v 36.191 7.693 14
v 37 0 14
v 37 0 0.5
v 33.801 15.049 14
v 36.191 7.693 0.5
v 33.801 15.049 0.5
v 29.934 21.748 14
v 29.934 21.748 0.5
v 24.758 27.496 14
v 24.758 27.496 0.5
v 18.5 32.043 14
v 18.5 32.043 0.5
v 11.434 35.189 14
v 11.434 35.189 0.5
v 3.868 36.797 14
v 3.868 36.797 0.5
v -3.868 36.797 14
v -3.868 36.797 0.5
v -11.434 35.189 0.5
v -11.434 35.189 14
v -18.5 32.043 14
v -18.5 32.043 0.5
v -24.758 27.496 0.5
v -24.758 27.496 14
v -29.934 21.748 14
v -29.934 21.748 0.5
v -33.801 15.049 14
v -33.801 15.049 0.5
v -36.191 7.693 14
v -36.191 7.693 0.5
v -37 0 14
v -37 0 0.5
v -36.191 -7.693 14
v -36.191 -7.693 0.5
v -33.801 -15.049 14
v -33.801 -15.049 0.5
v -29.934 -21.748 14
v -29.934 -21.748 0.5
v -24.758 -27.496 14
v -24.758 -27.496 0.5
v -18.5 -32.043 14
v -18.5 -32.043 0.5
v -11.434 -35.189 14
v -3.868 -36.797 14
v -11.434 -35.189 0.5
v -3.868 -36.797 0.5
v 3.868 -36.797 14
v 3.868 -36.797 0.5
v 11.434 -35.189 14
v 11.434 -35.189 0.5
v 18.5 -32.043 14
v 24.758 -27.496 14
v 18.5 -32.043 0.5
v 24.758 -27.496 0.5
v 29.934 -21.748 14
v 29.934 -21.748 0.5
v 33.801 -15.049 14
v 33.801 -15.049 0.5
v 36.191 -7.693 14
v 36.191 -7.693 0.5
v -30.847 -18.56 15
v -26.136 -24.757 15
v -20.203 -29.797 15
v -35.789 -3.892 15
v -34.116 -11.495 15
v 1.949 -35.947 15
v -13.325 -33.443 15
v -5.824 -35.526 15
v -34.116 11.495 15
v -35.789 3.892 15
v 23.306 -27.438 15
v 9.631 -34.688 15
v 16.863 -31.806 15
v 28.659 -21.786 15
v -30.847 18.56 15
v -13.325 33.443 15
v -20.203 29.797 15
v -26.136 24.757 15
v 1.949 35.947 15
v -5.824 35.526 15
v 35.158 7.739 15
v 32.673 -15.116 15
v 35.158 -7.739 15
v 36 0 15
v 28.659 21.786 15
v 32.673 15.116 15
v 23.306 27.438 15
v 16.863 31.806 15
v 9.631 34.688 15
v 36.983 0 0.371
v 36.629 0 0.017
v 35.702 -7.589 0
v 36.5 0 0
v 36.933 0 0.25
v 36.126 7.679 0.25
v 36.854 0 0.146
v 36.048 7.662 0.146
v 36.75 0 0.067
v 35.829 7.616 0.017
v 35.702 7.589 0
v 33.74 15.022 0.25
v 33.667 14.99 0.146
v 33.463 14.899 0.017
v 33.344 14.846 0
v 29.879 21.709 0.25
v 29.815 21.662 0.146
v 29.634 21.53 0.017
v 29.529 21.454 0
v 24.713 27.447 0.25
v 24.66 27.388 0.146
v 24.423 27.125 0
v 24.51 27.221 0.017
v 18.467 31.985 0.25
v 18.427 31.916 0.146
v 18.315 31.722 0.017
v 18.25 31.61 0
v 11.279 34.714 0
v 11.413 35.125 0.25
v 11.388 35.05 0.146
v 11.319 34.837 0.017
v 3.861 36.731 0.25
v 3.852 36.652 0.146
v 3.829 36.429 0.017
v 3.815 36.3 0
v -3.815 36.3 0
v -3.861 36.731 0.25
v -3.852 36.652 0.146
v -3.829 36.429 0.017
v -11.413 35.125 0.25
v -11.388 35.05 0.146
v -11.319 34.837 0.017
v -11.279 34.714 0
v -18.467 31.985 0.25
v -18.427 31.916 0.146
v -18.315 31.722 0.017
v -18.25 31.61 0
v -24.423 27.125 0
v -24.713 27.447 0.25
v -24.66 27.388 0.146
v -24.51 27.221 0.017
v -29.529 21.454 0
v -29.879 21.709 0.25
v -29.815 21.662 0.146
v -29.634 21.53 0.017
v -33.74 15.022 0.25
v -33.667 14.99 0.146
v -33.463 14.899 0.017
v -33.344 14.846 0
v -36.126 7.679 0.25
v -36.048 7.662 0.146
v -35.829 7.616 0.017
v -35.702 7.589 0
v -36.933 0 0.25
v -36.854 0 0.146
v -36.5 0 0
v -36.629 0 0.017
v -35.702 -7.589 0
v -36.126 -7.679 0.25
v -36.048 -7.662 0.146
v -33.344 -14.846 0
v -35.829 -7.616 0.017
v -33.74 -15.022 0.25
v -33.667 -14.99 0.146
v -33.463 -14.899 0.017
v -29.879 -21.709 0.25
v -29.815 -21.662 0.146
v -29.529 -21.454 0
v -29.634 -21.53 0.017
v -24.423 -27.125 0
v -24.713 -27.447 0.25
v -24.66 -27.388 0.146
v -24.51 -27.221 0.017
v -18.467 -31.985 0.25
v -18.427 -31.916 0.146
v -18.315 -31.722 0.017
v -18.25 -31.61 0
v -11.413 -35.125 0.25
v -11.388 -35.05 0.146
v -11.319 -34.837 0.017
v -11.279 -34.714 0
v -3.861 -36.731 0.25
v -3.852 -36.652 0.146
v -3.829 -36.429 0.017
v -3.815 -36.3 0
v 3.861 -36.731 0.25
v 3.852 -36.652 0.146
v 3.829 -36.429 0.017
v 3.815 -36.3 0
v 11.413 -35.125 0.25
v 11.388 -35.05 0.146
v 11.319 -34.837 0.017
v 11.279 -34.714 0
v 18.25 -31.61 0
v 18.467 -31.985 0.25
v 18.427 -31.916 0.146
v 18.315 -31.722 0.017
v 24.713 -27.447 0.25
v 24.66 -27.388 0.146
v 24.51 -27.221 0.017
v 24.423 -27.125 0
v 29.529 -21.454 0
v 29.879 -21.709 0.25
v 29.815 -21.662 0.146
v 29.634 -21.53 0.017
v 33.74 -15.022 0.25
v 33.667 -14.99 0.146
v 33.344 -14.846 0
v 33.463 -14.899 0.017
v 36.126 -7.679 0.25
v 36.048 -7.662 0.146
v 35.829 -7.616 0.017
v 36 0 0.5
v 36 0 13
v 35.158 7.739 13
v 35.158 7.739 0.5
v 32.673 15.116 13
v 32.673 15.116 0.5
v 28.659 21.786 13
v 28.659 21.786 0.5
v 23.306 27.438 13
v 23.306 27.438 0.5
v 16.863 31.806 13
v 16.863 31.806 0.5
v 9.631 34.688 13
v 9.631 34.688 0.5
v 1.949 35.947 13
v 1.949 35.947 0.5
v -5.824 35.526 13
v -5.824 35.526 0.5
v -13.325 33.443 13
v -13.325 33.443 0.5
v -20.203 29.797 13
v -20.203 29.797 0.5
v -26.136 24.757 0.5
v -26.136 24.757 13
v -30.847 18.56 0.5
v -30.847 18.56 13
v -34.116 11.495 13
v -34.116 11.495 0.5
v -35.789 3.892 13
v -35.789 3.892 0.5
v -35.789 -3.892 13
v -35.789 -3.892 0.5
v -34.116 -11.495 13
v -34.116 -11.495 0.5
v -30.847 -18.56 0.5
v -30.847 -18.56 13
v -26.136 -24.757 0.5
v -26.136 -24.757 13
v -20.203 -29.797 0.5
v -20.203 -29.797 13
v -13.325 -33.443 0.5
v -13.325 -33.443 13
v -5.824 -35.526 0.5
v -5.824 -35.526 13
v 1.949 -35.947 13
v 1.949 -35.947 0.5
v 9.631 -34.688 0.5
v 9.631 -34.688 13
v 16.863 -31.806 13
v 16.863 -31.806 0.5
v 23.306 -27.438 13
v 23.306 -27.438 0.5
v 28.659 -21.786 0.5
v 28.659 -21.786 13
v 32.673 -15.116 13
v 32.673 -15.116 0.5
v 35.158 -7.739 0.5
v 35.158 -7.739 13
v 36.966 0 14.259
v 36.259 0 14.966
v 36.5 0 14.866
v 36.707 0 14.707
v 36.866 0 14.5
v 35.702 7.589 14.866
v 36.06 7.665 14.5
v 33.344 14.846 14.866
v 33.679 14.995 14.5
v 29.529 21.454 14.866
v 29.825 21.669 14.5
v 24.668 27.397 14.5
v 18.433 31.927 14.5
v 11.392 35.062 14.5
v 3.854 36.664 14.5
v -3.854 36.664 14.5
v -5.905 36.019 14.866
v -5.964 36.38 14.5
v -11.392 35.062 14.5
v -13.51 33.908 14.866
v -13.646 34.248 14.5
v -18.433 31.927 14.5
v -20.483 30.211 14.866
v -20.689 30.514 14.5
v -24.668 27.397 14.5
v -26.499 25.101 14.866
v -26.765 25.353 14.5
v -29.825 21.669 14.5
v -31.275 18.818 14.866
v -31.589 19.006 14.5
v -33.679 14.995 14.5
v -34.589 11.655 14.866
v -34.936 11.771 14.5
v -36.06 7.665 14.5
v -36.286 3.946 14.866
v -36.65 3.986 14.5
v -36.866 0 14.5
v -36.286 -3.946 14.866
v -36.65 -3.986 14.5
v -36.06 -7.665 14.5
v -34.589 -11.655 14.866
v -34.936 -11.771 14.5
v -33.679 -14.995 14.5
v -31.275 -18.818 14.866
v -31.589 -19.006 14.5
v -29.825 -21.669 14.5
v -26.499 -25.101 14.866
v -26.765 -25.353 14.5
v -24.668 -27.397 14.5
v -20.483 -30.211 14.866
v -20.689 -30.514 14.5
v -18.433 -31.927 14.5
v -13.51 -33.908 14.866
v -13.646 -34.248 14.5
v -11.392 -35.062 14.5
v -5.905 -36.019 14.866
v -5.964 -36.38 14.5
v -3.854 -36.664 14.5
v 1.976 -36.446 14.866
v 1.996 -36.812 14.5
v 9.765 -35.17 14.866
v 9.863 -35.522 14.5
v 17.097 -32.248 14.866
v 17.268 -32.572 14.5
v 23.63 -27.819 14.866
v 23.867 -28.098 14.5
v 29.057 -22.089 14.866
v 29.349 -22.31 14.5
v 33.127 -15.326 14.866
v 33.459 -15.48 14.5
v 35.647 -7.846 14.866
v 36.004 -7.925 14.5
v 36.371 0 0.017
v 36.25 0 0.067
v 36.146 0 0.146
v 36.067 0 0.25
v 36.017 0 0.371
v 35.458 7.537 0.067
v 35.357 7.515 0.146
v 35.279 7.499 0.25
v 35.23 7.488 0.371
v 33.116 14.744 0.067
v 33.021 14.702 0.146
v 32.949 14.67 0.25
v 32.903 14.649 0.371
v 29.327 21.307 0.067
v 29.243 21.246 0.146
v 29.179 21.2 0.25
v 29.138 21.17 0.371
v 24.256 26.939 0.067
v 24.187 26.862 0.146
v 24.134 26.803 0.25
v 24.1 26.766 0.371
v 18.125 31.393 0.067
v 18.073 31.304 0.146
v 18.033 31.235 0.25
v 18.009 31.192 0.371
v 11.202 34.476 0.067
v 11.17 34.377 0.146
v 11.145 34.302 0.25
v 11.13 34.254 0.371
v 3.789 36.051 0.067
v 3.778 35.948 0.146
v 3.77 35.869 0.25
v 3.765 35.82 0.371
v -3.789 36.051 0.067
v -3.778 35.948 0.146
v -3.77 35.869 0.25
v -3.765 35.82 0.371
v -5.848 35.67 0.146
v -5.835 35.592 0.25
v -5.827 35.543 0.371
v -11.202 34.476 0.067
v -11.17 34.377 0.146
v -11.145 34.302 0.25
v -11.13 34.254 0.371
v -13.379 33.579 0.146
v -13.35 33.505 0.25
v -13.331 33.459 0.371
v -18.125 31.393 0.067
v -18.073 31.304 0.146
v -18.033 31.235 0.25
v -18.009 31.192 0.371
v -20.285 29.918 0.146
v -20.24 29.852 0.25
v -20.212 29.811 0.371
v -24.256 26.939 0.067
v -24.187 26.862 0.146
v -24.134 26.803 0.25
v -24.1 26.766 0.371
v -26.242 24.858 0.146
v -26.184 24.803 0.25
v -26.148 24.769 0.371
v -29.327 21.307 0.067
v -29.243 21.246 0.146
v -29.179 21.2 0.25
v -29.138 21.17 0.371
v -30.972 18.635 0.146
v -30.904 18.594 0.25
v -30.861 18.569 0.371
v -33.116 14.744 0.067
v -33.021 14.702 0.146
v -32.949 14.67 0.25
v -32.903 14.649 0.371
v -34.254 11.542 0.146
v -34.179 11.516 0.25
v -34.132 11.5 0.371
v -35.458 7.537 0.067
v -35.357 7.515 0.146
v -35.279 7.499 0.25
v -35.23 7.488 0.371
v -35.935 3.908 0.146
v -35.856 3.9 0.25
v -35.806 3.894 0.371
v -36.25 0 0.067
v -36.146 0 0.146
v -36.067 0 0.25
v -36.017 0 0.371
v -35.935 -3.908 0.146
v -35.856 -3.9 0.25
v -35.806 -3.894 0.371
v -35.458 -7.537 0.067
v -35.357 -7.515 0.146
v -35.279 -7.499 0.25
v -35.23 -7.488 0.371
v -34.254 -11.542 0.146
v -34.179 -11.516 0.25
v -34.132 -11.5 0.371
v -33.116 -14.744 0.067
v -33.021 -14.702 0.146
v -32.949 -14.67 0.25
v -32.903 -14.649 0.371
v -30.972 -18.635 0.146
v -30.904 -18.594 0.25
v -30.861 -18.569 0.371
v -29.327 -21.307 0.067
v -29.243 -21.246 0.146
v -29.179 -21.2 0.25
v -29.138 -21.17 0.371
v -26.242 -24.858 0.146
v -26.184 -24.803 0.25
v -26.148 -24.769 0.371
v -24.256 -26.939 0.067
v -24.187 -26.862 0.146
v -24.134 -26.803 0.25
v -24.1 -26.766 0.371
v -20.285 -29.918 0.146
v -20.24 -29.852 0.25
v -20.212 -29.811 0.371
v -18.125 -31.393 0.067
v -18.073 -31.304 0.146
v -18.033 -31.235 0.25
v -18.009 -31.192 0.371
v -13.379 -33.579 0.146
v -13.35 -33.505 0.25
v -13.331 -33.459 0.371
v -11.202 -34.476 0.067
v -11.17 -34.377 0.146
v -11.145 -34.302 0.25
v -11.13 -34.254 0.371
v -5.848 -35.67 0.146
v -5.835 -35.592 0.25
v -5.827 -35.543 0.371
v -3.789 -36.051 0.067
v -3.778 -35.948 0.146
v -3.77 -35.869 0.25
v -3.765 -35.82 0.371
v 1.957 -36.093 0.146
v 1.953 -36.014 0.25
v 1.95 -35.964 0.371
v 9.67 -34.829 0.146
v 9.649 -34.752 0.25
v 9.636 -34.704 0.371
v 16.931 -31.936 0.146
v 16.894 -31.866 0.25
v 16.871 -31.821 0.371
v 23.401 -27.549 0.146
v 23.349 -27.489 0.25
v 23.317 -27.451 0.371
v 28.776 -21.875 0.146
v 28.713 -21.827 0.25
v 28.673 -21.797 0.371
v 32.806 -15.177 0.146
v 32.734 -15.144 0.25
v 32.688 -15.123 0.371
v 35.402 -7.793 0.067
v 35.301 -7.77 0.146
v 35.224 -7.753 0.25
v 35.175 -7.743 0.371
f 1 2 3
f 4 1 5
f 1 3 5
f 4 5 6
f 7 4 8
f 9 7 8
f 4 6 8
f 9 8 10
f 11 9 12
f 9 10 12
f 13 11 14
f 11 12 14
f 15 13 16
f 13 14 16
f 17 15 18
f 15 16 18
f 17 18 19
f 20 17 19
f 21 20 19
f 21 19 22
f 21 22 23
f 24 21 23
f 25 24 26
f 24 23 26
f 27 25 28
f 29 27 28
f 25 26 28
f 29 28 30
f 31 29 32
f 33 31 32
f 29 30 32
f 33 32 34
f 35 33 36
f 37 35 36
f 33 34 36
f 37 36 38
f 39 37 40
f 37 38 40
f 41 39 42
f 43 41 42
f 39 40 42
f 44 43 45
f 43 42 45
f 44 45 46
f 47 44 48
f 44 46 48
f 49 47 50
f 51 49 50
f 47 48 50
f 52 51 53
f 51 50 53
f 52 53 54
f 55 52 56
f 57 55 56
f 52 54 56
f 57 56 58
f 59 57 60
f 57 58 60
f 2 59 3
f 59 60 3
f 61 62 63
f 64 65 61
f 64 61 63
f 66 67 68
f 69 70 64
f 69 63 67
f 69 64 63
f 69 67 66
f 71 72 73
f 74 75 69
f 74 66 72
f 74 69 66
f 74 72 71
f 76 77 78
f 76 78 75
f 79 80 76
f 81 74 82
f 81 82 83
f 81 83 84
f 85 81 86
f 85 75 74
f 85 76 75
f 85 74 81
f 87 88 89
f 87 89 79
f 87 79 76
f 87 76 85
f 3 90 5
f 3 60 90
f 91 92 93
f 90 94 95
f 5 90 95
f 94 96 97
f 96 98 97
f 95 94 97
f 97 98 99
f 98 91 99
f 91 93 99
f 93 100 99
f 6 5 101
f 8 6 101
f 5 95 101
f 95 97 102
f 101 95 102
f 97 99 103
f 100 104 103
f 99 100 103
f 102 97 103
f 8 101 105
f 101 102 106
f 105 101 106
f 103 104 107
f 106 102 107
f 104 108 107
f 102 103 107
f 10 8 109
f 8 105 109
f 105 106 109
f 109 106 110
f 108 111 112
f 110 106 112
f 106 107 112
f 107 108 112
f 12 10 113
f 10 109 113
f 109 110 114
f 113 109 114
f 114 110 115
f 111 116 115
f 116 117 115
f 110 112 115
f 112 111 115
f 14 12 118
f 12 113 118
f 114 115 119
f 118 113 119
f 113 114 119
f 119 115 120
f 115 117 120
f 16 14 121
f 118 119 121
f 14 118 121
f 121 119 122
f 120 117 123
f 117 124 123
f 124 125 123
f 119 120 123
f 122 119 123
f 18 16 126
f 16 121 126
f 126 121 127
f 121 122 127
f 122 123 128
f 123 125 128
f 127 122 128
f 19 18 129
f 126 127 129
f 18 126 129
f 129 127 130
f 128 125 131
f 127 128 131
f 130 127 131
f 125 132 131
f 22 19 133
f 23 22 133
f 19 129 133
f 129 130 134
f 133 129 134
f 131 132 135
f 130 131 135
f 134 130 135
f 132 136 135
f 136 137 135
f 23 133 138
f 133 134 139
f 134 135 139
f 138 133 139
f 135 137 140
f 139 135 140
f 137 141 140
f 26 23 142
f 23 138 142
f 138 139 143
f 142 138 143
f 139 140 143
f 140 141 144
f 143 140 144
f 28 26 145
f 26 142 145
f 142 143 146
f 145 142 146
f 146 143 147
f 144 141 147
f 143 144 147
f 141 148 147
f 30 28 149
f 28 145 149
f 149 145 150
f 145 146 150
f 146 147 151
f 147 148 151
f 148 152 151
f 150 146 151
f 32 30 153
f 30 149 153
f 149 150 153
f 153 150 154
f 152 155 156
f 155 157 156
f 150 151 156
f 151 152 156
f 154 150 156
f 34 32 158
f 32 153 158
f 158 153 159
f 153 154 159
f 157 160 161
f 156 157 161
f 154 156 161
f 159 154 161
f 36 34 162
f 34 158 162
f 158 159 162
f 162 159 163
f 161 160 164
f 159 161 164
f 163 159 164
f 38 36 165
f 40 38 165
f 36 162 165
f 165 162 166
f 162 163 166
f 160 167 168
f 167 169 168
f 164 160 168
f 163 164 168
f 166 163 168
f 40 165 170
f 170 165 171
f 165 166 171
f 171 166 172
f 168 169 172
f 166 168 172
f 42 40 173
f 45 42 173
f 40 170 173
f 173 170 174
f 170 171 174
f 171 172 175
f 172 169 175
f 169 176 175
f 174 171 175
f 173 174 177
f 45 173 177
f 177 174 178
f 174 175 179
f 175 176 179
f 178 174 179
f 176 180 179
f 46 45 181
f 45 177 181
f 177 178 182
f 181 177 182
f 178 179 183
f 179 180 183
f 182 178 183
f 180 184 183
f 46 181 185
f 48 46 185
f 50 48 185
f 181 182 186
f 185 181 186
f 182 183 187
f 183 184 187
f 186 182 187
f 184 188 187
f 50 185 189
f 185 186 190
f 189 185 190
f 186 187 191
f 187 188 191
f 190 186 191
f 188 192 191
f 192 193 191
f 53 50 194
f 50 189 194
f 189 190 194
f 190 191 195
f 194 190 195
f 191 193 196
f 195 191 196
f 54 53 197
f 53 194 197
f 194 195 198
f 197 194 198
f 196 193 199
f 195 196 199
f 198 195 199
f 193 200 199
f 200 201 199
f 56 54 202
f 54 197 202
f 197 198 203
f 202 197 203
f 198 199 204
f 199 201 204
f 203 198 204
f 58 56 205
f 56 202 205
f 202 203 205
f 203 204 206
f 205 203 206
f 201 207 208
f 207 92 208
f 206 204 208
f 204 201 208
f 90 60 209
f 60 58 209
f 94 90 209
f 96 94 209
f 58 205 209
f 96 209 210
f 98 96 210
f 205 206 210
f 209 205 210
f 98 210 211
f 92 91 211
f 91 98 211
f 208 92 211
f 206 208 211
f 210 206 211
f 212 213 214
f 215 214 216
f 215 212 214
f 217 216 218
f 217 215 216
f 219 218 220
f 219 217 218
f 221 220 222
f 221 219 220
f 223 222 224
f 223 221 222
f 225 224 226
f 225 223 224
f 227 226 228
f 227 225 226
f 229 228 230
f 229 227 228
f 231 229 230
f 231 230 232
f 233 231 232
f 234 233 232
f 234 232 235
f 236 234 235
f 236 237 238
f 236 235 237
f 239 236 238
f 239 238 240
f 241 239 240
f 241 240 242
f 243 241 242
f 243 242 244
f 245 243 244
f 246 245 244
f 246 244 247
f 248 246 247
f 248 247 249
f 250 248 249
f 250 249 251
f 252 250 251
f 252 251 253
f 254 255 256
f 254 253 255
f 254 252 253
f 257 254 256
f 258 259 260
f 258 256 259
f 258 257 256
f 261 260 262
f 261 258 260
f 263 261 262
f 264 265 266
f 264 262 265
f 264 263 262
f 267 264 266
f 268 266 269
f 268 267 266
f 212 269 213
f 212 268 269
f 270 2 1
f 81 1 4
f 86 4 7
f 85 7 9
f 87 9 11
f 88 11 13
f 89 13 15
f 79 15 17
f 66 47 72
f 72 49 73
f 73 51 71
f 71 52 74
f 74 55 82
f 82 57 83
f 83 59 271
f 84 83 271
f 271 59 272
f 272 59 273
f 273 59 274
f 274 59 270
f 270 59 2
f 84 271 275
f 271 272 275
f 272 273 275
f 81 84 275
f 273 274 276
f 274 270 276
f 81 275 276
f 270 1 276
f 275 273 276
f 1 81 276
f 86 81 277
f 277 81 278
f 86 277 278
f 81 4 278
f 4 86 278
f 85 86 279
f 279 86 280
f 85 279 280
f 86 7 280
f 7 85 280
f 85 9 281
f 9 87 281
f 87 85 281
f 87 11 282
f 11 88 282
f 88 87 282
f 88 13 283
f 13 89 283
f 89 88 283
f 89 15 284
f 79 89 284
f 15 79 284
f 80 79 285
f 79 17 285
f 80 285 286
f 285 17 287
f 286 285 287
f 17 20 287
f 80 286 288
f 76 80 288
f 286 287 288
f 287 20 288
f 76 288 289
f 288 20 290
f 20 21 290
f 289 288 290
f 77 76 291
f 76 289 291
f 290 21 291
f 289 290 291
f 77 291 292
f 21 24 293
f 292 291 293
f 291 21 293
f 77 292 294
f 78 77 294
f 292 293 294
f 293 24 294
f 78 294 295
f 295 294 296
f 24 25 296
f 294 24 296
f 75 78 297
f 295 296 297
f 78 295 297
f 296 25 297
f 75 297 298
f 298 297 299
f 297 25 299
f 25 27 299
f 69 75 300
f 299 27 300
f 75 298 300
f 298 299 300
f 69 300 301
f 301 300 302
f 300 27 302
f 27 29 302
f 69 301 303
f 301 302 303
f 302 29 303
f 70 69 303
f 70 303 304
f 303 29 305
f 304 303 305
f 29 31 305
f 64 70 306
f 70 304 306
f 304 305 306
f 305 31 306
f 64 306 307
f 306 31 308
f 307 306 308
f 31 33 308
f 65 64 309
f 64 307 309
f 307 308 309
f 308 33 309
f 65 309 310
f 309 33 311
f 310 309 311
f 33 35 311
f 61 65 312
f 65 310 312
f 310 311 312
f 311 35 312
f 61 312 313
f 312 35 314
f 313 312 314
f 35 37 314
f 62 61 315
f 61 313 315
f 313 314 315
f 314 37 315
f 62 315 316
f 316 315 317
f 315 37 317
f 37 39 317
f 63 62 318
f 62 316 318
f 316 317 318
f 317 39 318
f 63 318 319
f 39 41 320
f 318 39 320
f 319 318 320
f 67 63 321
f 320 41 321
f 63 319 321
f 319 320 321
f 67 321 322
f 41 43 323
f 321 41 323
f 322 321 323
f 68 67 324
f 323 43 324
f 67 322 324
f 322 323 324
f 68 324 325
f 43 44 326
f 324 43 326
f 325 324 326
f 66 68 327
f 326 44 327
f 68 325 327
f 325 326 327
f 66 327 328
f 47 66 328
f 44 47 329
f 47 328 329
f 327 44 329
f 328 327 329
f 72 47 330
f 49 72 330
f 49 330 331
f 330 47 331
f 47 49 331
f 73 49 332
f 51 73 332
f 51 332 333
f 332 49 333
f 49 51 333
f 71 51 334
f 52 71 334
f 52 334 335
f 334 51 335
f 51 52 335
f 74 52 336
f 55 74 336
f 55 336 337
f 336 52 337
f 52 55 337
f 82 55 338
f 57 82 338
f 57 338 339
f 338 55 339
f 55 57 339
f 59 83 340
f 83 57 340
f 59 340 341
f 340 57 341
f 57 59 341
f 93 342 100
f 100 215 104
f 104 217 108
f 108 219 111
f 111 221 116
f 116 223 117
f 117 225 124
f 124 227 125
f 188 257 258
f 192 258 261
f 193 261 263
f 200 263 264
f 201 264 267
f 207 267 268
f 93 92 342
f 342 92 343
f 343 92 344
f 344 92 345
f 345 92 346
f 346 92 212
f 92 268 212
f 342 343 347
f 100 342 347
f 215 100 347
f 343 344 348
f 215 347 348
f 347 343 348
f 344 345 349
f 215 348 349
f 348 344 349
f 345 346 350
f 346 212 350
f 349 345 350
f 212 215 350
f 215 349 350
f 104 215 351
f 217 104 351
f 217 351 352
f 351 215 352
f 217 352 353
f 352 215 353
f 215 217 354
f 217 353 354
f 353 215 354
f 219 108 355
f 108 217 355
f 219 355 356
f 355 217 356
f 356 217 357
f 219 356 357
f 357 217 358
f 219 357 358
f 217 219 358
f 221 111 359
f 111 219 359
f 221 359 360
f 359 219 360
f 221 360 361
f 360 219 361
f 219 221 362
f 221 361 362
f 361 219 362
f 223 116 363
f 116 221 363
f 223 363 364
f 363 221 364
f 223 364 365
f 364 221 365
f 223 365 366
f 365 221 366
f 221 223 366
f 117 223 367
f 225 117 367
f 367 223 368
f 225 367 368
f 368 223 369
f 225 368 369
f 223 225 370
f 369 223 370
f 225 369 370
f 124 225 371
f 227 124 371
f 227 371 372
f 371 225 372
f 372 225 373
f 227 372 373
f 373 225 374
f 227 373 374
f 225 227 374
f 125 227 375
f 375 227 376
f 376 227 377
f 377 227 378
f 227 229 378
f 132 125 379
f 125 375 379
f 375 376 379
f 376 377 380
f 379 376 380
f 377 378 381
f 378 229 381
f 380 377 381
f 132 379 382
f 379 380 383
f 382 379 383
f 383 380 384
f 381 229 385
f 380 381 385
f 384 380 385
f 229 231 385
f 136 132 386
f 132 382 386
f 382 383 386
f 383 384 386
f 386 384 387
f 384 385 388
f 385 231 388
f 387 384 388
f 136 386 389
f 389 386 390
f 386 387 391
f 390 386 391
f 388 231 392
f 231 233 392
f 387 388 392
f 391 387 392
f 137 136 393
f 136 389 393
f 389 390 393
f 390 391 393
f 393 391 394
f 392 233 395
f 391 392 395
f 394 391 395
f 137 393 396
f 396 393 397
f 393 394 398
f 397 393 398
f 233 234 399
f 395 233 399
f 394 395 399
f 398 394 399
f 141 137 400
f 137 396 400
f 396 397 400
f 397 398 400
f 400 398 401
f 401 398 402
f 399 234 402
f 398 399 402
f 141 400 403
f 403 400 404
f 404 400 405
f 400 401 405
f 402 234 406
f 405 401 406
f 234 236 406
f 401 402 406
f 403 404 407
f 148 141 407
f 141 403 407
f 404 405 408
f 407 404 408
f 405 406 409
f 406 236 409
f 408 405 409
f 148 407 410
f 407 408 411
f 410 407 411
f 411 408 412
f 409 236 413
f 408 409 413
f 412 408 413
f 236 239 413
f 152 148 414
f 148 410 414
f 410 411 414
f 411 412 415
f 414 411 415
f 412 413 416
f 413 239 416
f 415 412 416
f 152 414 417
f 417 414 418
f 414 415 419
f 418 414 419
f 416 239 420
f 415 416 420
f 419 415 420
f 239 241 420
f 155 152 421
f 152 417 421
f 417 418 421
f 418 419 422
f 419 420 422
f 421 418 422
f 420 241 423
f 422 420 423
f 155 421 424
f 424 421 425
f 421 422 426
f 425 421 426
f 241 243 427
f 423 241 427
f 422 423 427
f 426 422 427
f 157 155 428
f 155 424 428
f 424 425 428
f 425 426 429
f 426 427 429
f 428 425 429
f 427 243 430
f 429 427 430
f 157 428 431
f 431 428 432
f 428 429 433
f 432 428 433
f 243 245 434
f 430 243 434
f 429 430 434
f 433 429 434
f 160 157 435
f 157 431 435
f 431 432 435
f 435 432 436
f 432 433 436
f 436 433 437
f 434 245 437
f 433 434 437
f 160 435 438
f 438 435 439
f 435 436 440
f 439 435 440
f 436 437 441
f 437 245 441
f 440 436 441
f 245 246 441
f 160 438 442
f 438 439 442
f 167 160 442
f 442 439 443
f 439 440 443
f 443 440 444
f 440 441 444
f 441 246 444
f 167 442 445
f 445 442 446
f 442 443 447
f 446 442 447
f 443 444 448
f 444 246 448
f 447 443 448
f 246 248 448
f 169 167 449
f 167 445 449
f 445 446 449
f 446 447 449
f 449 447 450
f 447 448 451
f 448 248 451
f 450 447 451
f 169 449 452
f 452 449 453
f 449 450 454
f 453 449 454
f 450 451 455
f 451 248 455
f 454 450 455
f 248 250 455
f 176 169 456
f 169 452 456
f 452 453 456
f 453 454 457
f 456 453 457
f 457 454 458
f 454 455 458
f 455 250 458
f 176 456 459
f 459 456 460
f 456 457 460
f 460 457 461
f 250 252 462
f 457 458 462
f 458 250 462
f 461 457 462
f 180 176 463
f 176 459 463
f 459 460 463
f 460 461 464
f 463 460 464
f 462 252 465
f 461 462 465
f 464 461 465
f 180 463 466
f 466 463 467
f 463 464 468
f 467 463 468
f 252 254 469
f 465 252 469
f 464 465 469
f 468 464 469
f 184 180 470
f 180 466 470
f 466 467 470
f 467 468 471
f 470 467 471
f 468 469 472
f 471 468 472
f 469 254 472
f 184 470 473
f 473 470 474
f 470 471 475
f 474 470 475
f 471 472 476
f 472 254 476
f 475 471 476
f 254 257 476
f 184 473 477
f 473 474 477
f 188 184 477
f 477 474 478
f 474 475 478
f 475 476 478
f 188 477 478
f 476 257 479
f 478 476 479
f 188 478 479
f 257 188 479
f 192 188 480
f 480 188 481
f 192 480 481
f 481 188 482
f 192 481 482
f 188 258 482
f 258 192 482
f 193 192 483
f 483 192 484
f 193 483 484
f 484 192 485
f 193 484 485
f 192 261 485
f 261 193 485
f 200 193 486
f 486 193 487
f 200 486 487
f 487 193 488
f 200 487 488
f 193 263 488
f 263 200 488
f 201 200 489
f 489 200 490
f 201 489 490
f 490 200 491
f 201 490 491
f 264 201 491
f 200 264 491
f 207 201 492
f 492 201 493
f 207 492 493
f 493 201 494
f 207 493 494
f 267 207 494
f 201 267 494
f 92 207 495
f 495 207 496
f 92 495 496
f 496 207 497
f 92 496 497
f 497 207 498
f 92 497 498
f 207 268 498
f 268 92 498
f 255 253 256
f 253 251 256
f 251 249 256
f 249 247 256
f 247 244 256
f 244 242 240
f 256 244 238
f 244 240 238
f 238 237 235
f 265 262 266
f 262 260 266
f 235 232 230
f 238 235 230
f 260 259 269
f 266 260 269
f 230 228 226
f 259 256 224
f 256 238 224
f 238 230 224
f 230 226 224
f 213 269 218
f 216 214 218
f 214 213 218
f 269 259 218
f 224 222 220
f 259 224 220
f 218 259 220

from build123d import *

# Parameters (mm, degrees)
F0_R     = 37
F0_R_2   = 36
F1_DEPTH = 15
F2_R     = 36.9218427358
F3_DEPTH = 2
F4_R     = 1
F5_R     = 0.49999


# Not quite as in the source:
# - a fillet or chamfer is up to 0.001 mm smaller than in the source, because OpenCascade refuses the exact size


with BuildPart() as f1:
    # F0 (on Top) → F1 (new body)
    with BuildSketch(Plane.XY):
        Circle(F0_R)
        Circle(F0_R_2, mode=Mode.SUBTRACT)
    extrude(amount=F1_DEPTH)

    # F2 (on face) → F3 (join)
    with BuildSketch(Plane.XY.offset(15)):
        Circle(F2_R)
    extrude(amount=-F3_DEPTH)

    # F4
    f4_edges = [f1.edges().sort_by_distance(p)[0] for p in [
        (-37, 0, 15),
    ]]
    fillet(f4_edges, radius=F4_R)

    # F5 (radius 0.5 in the source; OpenCascade refuses exactly that, so slightly less here)
    f5_edges = [f1.edges().sort_by_distance(p)[0] for p in [
        (-37, 0, 0),
        (-36, 0, 0),
    ]]
    fillet(f5_edges, radius=F5_R)


solid = f1.part
